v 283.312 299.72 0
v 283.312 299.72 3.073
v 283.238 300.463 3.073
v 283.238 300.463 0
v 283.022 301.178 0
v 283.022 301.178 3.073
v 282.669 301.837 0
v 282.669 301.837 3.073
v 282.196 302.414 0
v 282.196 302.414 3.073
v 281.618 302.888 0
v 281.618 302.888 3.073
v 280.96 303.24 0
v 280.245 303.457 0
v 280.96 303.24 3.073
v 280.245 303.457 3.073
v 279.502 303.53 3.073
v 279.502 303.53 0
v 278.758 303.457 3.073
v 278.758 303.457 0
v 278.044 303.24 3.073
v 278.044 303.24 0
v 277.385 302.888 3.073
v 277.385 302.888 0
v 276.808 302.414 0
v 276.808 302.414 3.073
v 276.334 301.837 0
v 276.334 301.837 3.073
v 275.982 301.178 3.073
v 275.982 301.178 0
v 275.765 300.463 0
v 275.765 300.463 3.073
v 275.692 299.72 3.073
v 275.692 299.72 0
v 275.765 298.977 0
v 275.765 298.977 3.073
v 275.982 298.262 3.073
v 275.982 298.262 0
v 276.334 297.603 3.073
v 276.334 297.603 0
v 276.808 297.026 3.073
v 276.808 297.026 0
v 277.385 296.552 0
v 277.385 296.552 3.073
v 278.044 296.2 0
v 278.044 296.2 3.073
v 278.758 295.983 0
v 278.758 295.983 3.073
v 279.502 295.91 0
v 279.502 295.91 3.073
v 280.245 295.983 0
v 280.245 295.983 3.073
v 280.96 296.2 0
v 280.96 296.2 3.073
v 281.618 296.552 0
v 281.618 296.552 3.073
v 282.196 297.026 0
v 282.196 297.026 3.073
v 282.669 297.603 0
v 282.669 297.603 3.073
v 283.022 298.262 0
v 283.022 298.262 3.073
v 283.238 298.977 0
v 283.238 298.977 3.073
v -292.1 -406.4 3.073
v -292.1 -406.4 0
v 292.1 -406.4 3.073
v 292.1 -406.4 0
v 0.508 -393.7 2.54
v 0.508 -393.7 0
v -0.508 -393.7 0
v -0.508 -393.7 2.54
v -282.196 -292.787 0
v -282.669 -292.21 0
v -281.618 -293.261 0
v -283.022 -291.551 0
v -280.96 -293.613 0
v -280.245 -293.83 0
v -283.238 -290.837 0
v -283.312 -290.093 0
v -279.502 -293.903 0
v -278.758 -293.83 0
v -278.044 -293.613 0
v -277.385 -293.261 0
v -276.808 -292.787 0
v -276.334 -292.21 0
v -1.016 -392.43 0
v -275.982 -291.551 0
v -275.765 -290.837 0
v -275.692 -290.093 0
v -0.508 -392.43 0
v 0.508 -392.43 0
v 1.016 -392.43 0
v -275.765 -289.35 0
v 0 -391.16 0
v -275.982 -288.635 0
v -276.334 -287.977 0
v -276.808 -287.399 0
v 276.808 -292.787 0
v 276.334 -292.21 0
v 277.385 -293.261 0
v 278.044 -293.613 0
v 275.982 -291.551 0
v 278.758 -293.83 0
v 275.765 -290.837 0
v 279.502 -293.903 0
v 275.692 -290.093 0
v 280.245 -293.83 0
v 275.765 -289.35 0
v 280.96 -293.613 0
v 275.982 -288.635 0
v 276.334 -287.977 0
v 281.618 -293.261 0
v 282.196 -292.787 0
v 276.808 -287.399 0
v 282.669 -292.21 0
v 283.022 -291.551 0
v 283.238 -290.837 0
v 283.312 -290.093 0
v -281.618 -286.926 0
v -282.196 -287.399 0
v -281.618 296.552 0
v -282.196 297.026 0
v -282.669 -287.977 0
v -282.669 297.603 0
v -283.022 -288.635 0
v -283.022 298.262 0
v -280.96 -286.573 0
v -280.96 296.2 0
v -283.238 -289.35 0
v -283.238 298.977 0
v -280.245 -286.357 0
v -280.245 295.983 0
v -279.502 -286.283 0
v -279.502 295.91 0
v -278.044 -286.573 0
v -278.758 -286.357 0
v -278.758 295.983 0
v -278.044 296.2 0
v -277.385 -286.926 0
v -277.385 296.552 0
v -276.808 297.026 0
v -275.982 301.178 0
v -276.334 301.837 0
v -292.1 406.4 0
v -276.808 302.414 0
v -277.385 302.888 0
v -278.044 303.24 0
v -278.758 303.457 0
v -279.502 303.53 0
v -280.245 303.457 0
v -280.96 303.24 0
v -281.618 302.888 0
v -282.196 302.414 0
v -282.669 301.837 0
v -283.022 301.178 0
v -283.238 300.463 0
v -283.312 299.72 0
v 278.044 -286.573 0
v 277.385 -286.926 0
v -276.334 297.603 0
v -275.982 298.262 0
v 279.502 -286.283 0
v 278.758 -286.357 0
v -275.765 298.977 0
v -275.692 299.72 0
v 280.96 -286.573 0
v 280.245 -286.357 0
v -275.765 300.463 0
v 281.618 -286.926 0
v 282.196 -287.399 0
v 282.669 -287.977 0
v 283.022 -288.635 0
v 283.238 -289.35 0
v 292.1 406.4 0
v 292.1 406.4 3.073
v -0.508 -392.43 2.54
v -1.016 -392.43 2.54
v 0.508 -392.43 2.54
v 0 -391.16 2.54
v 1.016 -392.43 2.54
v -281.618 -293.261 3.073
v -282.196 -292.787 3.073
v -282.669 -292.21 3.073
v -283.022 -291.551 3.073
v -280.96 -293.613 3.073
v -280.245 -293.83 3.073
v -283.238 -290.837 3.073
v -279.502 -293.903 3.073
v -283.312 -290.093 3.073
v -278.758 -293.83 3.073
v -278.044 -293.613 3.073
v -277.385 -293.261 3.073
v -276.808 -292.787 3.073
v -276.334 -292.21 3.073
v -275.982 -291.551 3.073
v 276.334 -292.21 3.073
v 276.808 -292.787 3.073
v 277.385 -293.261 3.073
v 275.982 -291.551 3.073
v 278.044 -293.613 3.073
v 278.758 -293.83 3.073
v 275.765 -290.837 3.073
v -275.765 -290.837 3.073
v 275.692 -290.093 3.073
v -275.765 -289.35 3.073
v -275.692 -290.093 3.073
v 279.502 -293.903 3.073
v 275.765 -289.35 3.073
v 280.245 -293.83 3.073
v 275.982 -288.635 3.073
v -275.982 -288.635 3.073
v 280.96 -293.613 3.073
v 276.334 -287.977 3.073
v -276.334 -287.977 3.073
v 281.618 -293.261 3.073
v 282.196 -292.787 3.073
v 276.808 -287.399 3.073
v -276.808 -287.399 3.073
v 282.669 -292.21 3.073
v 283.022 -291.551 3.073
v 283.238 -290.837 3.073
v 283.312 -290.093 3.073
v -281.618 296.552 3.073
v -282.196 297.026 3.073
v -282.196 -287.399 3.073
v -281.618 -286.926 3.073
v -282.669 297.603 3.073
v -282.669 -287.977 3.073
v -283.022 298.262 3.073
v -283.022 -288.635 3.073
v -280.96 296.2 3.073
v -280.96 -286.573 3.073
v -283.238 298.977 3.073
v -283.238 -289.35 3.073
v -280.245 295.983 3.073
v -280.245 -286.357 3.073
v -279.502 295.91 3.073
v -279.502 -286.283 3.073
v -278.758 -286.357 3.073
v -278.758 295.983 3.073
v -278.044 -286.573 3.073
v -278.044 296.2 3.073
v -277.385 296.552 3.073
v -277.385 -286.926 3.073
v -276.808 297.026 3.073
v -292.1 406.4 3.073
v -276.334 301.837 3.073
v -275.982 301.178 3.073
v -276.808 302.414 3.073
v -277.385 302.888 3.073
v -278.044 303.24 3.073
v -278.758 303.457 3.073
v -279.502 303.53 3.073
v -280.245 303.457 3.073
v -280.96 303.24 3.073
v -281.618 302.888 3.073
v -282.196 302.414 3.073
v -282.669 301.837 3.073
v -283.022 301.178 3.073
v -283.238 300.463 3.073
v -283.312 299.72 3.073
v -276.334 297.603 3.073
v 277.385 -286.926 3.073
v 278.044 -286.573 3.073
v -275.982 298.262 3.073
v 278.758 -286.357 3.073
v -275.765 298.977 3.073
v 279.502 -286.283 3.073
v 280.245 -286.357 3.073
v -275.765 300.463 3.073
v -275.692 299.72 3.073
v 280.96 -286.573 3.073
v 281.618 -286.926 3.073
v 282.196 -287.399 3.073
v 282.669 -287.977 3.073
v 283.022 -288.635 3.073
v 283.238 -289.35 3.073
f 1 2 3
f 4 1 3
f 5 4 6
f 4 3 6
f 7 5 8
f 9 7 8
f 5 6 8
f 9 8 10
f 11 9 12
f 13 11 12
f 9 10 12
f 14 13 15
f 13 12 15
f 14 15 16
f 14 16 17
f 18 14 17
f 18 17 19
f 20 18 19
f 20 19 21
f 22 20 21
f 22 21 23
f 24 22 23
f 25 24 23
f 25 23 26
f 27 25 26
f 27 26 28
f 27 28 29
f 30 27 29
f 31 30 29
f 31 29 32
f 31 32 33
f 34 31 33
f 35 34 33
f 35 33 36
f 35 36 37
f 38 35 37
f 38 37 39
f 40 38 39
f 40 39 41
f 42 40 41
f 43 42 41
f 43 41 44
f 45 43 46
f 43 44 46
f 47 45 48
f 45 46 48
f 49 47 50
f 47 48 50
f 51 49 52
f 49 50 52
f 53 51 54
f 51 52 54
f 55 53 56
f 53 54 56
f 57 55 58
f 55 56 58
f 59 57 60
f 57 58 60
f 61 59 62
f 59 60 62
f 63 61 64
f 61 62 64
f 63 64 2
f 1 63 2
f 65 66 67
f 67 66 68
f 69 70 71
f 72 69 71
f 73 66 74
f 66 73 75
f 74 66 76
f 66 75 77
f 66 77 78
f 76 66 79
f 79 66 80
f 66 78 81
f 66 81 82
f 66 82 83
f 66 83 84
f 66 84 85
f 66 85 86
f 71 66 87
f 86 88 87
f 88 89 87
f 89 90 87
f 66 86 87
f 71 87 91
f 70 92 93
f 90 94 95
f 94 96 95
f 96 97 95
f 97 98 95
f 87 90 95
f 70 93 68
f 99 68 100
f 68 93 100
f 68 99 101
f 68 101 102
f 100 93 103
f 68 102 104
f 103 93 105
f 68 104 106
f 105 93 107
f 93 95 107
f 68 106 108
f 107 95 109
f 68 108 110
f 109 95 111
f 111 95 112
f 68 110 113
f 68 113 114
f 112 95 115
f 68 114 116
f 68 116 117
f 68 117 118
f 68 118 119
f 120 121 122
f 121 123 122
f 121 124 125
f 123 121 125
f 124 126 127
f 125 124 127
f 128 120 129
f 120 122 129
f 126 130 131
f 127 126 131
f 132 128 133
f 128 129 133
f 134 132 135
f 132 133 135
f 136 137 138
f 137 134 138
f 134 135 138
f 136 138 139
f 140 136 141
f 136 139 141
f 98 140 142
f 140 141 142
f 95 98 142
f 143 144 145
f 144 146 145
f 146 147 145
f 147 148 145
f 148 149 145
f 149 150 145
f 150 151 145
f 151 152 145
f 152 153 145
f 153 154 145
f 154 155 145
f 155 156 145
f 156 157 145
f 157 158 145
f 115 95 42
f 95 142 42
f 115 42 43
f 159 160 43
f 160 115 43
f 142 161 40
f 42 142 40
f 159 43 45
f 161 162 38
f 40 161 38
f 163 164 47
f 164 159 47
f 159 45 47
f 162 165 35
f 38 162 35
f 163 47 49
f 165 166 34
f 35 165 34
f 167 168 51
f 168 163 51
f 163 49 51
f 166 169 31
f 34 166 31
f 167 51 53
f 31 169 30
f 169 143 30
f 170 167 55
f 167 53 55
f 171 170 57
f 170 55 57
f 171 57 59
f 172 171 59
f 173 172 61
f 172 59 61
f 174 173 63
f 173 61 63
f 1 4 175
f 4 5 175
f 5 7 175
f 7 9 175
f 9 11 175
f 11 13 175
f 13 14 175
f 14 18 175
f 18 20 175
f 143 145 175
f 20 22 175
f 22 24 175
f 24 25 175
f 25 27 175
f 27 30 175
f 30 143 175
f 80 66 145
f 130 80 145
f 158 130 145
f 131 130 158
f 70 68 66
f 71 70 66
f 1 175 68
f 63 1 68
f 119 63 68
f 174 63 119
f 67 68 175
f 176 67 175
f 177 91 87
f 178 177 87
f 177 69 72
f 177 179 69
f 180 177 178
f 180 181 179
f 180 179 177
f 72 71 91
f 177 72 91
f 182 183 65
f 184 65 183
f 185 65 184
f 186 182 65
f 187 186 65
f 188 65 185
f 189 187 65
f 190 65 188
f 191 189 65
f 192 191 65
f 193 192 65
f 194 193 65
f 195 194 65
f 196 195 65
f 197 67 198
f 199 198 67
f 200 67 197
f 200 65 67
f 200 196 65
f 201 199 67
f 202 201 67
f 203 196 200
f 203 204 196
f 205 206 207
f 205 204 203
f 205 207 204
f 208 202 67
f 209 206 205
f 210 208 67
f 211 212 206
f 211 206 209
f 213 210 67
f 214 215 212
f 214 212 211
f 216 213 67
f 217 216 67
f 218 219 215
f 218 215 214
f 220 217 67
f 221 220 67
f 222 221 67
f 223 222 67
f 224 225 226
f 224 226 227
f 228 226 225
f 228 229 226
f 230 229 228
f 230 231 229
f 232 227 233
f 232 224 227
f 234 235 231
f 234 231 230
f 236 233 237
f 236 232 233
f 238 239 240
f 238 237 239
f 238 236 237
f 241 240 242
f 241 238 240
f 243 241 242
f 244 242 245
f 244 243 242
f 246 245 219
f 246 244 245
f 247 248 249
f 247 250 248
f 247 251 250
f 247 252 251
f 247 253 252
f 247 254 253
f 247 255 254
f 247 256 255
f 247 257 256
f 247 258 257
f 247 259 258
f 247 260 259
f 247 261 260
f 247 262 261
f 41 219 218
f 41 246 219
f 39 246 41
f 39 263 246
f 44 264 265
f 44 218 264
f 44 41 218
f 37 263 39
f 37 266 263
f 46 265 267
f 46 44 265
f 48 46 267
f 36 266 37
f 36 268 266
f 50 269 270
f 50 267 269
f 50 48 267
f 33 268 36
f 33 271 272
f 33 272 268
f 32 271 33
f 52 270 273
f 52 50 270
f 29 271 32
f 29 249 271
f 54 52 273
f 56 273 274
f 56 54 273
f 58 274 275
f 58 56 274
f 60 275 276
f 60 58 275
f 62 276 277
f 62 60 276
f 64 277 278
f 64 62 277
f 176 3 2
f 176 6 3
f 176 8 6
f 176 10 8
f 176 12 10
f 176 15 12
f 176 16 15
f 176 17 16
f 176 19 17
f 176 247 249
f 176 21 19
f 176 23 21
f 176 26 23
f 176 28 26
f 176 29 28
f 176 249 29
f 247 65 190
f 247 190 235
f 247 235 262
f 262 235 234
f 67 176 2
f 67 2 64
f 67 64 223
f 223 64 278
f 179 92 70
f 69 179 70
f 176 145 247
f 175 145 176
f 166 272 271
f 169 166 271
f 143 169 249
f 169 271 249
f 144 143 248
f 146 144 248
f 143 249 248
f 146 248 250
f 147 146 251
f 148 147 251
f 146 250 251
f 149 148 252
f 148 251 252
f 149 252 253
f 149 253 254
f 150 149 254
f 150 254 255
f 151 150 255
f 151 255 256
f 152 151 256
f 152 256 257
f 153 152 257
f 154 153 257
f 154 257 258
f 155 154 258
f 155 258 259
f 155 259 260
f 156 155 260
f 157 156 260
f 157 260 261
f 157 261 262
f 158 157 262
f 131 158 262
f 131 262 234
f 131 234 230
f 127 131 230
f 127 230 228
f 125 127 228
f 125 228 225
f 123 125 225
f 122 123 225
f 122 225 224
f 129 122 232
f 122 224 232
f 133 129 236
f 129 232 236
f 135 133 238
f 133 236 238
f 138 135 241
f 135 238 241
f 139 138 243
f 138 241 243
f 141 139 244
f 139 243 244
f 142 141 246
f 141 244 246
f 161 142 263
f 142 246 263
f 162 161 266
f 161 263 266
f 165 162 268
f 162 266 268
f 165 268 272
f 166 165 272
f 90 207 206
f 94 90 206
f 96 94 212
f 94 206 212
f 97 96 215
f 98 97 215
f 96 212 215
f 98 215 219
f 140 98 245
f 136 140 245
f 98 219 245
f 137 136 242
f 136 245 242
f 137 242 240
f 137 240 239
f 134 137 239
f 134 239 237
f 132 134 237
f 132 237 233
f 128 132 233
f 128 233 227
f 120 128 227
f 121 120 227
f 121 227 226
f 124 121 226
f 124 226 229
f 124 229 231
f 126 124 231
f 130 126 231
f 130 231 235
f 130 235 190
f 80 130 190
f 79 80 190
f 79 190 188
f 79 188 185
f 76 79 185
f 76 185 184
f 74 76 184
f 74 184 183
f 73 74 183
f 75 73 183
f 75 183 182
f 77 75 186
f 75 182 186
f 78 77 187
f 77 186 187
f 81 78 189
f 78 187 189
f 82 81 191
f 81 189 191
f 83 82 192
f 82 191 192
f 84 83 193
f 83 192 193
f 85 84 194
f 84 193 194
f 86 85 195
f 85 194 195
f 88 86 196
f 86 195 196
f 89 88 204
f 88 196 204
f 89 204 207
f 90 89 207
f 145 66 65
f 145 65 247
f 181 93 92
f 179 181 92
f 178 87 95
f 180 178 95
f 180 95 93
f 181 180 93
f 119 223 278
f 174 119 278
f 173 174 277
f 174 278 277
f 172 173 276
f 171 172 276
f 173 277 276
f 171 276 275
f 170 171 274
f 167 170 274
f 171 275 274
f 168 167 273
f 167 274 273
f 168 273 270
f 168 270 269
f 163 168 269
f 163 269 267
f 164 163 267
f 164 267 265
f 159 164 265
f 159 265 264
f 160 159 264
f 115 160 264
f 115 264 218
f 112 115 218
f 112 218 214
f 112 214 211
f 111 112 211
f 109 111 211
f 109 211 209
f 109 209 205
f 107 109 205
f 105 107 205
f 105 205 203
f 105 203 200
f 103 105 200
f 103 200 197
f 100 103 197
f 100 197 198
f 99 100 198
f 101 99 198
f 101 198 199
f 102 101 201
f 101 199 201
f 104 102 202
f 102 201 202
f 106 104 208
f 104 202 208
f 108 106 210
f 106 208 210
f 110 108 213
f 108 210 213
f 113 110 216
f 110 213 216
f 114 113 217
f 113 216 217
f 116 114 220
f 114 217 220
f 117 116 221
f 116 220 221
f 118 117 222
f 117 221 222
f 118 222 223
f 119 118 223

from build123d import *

# Parameters (mm, degrees)
SKETCH1_W           = 584.2
SKETCH1_H           = 812.8
BOSS_EXTRUDE1_DEPTH = 3.0734
SKETCH3_R           = 3.81
CUT_EXTRUDE1_DEPTH  = 4.0734
CUT_EXTRUDE2_DEPTH  = 2.54


with BuildPart() as part:
    # Sketch1 → Boss-Extrude1 (new body)
    with BuildSketch(Plane.XY):
        Rectangle(SKETCH1_W, SKETCH1_H)
    extrude(amount=BOSS_EXTRUDE1_DEPTH)

    # Sketch3 → Cut-Extrude1 (cut, through all)
    with BuildSketch(Plane.XY.offset(3.0734)):
        with Locations((279.5016, 299.72)):
            Circle(SKETCH3_R)
        with Locations((-279.5016, -290.0934)):
            Circle(SKETCH3_R)
        with Locations((279.5016, -290.0934)):
            Circle(SKETCH3_R)
        with Locations((-279.5016, 299.72)):
            Circle(SKETCH3_R)
    extrude(amount=-CUT_EXTRUDE1_DEPTH, mode=Mode.SUBTRACT)

    # Sketch4 → Cut-Extrude2 (cut)
    with BuildSketch(Plane(origin=(0, 0, 0), x_dir=(-1, 0, 0), z_dir=(0, 0, -1))):
        Polygon((-0.508, -393.7), (0.508, -393.7), (0.508, -392.43), (1.016, -392.43), (0, -391.16), (-1.016, -392.43), (-0.508, -392.43), align=None)
    extrude(amount=-CUT_EXTRUDE2_DEPTH, mode=Mode.SUBTRACT)


solid = part.part
